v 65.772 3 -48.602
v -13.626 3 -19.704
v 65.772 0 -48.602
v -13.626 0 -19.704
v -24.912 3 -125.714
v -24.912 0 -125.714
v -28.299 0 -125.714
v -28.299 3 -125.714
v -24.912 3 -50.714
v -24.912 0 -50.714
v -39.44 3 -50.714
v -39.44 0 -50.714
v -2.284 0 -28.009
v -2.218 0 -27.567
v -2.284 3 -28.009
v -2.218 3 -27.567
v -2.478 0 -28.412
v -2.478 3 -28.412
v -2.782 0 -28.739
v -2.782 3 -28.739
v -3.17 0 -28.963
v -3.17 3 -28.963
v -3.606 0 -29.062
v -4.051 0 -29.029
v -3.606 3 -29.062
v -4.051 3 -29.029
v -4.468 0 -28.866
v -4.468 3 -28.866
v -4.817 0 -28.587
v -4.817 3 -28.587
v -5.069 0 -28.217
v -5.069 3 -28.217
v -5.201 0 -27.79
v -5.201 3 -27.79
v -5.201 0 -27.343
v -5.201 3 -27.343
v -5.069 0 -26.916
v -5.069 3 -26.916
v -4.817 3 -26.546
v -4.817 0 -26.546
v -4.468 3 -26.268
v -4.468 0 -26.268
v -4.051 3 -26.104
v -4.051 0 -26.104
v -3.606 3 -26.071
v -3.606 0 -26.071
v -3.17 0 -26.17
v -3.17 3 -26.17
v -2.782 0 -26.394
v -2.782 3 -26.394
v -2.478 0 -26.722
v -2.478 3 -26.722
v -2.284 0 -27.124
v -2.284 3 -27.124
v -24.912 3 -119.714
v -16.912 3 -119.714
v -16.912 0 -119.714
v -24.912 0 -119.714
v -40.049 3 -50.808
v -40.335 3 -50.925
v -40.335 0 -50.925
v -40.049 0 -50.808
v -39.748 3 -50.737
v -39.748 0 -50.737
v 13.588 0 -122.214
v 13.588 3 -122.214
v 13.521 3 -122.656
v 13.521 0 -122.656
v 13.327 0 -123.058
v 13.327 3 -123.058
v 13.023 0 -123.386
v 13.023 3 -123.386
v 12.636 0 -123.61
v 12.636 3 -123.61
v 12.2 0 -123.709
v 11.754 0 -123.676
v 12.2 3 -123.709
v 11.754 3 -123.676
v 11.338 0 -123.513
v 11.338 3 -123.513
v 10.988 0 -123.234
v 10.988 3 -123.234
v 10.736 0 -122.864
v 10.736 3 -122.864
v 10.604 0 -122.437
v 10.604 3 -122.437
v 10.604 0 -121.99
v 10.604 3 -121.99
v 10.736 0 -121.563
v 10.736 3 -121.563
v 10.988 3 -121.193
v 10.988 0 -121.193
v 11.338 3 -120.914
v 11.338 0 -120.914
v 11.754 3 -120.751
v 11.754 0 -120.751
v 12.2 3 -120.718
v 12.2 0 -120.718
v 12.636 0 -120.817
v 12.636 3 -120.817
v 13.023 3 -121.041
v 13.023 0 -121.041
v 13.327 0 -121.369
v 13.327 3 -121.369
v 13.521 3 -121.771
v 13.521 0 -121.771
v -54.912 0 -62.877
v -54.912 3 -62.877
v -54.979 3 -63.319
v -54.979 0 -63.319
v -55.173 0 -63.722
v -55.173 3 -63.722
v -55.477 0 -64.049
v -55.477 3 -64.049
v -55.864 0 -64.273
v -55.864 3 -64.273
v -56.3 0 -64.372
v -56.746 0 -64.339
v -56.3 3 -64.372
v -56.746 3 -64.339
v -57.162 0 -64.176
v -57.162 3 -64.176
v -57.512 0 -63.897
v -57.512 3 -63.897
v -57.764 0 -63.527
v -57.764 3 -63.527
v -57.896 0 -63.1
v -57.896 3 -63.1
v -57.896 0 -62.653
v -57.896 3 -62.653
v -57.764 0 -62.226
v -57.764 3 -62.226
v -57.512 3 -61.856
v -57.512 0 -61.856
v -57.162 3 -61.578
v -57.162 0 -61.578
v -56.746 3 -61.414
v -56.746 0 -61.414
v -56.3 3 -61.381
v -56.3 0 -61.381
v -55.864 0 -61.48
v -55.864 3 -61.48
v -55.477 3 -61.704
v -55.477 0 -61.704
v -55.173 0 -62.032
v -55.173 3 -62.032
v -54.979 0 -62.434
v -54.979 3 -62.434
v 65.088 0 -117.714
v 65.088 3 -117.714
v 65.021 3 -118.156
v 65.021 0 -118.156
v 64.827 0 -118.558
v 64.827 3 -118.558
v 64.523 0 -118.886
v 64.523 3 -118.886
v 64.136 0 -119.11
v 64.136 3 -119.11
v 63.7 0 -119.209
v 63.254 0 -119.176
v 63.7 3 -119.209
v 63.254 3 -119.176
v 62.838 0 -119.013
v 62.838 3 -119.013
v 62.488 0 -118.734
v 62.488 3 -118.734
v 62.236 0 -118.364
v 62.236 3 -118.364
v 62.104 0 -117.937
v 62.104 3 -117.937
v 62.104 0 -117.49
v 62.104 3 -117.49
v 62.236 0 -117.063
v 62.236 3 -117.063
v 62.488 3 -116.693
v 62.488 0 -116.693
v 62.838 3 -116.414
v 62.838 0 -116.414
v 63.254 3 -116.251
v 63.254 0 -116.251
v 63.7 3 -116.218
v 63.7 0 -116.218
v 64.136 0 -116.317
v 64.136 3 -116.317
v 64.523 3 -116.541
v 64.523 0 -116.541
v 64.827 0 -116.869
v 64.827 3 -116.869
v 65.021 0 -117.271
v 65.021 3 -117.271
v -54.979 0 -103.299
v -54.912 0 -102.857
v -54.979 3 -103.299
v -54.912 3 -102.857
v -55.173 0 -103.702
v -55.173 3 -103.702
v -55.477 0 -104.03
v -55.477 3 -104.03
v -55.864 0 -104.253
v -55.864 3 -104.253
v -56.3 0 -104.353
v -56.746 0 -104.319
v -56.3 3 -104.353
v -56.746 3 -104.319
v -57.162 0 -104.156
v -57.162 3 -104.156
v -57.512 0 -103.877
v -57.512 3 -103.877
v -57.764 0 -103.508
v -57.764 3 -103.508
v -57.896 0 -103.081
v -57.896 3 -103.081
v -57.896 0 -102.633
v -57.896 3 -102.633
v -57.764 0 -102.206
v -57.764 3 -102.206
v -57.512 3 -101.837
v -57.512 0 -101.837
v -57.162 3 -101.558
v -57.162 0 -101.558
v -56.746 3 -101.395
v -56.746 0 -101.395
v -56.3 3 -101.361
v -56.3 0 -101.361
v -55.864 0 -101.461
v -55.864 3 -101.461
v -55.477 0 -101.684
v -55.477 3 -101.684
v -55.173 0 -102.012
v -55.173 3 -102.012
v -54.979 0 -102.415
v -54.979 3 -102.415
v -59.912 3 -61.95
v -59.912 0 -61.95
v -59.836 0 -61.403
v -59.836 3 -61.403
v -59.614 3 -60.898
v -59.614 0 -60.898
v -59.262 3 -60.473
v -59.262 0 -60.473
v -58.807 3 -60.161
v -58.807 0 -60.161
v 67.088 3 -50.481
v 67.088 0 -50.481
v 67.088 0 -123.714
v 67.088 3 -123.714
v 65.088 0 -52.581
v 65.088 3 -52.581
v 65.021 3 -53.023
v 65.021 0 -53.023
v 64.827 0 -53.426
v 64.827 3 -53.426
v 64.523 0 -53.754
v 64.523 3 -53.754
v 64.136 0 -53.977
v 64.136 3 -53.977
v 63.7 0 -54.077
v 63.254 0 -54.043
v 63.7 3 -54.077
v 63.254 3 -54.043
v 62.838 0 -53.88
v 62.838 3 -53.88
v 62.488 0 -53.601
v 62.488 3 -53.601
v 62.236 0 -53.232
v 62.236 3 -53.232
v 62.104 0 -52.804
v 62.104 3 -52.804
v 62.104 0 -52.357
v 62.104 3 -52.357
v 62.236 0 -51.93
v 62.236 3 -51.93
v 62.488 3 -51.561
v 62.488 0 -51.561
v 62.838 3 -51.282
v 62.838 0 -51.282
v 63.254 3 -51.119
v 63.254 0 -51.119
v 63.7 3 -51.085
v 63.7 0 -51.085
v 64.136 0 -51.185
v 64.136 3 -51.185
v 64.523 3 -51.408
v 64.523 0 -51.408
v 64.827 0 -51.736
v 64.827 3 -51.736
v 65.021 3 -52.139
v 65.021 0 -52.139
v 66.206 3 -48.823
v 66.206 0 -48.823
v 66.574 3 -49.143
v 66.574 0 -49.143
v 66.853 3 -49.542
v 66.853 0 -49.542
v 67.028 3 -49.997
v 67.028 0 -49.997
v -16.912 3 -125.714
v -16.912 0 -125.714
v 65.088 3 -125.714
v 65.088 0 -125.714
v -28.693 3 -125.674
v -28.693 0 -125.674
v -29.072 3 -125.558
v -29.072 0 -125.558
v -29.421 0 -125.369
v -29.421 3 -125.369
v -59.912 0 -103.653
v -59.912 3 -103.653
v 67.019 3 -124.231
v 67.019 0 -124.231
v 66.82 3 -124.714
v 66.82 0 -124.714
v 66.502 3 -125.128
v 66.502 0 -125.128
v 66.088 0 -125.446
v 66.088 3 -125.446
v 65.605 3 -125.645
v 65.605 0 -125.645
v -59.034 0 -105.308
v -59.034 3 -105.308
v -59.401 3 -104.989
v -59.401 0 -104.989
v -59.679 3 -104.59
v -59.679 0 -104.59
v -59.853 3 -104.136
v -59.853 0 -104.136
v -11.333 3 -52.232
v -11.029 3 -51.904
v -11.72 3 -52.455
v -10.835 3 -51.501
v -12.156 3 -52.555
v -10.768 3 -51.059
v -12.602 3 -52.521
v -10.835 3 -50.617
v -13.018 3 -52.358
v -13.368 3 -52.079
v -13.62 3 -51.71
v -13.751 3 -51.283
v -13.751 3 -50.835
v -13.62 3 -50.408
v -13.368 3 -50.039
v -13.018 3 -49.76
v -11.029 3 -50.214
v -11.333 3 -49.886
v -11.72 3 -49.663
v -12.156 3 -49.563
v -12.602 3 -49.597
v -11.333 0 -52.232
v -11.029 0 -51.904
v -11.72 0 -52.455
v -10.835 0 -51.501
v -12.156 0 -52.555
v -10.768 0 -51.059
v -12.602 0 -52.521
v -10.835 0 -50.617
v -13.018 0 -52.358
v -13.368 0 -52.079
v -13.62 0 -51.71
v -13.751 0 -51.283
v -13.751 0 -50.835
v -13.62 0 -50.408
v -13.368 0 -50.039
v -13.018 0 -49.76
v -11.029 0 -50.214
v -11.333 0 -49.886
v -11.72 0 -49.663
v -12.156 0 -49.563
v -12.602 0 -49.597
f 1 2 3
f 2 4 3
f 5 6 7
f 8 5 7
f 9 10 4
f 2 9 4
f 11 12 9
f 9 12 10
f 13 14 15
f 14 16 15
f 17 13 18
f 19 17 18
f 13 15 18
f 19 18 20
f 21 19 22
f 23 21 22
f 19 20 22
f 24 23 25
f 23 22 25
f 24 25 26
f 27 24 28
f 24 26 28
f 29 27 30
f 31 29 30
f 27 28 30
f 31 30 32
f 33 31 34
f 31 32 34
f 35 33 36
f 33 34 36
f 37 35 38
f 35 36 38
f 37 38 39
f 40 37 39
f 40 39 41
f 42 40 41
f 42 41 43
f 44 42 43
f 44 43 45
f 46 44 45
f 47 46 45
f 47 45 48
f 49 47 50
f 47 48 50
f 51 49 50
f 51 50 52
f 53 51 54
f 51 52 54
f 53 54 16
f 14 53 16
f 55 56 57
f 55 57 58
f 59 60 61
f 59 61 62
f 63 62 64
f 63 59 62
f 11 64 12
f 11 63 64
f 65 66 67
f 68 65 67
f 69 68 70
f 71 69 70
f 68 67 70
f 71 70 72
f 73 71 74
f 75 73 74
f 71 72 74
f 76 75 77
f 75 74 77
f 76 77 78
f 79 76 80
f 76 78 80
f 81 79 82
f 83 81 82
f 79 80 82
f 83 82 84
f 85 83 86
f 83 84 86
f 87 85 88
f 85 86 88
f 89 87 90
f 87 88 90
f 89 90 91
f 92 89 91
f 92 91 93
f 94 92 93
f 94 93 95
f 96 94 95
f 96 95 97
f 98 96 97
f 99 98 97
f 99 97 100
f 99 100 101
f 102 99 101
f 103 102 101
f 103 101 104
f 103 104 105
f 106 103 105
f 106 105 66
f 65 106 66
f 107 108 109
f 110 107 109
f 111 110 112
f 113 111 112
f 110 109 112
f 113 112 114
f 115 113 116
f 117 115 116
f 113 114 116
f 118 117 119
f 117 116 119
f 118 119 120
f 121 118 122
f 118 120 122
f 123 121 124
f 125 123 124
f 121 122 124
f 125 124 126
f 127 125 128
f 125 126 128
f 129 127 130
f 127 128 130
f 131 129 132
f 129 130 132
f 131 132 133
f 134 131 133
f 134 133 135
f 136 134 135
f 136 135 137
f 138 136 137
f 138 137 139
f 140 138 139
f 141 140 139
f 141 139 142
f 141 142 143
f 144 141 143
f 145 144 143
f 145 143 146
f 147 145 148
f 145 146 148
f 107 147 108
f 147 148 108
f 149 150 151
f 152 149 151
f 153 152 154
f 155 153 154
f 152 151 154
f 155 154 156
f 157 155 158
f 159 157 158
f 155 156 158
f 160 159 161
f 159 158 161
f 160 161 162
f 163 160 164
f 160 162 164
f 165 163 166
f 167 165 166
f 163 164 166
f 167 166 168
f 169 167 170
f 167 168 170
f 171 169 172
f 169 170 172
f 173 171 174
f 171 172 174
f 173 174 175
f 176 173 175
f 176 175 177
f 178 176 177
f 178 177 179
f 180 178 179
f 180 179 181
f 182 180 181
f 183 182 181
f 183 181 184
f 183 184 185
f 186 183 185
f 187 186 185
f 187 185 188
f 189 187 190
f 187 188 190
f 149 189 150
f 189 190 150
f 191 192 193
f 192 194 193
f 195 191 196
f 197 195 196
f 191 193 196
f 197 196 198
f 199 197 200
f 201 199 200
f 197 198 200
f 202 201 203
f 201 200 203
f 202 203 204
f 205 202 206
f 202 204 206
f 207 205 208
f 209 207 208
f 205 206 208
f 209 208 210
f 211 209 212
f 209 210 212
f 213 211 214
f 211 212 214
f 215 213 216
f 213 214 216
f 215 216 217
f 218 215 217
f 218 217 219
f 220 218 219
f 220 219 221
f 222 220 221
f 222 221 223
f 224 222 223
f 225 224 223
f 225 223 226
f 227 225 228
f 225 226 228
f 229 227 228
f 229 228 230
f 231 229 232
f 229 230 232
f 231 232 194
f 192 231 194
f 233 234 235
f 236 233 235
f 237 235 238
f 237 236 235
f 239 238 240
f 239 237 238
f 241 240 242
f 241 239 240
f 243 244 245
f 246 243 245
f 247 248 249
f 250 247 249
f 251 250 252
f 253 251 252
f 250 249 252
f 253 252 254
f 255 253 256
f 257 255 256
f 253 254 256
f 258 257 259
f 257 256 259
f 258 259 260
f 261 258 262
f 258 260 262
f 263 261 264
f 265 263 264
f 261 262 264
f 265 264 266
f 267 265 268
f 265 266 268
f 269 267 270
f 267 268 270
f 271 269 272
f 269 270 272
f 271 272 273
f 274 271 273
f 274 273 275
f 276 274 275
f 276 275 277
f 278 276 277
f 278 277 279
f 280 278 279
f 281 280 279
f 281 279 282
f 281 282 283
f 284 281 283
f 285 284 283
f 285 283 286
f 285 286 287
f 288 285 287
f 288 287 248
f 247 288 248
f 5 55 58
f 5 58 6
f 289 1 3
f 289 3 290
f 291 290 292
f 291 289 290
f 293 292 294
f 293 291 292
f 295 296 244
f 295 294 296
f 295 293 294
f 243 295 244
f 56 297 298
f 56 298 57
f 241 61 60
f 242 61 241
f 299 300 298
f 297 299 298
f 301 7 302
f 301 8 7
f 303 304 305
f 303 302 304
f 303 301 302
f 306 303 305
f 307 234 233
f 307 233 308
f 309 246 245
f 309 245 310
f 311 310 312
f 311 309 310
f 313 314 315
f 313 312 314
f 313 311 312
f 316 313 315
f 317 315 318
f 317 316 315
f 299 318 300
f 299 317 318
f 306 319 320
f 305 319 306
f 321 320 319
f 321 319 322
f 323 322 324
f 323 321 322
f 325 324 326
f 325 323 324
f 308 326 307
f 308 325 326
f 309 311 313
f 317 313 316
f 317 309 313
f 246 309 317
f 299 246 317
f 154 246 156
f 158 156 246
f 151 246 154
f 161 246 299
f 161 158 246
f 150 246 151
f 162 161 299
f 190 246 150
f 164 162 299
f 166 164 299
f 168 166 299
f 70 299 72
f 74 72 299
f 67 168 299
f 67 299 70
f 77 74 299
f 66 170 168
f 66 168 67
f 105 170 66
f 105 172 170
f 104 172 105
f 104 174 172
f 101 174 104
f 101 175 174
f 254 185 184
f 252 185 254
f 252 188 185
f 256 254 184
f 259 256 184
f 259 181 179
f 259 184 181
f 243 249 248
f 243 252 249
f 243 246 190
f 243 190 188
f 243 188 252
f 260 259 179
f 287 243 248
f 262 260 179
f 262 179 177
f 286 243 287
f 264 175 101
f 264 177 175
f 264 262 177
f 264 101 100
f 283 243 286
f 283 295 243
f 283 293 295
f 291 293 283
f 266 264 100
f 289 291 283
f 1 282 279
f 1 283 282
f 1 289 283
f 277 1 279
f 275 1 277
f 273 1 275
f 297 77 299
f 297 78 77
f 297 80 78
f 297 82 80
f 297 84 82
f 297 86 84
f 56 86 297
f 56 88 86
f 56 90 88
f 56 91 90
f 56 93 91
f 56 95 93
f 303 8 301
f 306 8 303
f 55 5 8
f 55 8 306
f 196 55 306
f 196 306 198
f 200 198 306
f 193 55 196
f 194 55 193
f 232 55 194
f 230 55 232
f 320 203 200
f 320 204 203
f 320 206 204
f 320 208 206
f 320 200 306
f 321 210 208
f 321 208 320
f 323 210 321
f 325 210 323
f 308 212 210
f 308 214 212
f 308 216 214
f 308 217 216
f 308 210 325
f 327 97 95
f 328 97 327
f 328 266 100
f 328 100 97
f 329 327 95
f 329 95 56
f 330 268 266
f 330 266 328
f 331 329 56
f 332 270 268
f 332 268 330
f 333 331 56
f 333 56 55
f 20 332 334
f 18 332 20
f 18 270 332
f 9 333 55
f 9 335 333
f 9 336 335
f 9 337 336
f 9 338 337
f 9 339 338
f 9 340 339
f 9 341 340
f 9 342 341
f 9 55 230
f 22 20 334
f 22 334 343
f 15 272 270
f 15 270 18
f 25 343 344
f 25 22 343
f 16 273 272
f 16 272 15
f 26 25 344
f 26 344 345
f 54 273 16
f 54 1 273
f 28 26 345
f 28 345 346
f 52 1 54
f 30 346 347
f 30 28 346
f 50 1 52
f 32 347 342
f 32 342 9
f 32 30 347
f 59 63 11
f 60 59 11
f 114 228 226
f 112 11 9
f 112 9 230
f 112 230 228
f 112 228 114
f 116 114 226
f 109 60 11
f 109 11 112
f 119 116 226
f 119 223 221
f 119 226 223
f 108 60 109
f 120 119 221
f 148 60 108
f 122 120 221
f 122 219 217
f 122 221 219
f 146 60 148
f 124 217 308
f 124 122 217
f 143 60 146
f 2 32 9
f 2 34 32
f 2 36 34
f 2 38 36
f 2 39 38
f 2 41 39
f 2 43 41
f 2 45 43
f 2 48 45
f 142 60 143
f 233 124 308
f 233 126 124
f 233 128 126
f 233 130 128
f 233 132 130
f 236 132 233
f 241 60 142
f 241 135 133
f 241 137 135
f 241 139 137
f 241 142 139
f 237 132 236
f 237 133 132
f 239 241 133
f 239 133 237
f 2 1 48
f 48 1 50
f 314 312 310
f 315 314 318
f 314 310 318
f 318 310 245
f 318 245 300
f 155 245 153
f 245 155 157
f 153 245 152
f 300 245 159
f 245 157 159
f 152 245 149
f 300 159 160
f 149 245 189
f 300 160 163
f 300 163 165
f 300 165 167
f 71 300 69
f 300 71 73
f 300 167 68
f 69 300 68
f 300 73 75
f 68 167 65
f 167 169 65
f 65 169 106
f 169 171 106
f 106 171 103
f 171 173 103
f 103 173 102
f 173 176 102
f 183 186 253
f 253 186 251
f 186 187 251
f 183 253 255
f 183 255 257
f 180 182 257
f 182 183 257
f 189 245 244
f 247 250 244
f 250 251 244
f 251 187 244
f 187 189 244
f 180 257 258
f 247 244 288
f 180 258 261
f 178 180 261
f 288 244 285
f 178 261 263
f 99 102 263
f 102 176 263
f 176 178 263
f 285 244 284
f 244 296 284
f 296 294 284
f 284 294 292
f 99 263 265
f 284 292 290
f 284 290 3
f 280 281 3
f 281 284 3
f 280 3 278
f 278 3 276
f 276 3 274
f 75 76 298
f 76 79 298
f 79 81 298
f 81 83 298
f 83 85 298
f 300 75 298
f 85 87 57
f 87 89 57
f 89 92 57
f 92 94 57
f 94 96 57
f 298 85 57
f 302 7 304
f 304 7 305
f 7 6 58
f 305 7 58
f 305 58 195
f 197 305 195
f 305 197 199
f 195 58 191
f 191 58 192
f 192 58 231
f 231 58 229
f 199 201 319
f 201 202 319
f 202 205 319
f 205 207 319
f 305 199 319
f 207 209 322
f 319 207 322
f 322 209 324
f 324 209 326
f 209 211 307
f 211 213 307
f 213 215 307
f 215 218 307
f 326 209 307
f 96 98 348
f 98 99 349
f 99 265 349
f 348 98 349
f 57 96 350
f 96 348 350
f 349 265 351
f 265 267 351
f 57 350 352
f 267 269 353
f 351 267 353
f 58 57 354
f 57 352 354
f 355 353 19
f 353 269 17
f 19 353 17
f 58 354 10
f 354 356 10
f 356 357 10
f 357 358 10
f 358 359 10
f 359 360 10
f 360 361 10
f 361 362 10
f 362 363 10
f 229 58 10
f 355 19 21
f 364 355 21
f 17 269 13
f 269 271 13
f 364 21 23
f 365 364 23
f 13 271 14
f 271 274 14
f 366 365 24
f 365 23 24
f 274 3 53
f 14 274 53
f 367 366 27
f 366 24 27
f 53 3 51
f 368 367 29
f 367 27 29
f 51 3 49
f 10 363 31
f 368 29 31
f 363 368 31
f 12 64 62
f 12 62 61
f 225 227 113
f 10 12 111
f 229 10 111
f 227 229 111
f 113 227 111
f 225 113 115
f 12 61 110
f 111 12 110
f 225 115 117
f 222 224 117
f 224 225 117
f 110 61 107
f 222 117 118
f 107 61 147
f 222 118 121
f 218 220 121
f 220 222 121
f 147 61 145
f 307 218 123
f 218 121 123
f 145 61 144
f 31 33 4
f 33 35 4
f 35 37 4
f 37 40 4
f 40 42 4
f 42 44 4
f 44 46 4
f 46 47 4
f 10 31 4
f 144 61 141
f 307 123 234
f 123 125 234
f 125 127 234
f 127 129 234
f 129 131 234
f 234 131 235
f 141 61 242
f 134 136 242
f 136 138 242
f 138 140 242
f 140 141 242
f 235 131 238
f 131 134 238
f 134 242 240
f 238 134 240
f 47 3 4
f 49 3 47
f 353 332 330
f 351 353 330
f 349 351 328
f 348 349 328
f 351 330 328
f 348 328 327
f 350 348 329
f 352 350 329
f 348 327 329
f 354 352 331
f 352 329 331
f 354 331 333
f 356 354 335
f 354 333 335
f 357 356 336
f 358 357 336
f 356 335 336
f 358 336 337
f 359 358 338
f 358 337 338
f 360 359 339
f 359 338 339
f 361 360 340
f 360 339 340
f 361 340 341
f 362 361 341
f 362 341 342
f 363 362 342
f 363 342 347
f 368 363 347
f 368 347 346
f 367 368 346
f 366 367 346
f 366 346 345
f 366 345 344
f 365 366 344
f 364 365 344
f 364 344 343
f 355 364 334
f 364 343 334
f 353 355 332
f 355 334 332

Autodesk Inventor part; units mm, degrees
ref_plane "YZ Plane" through (0, 0, 0) normal (1, 0, 0) x (0, 1, 0)
ref_plane "XZ Plane" through (0, 0, 0) normal (0, 1, 0) x (-1, 0, 0)
ref_plane "XY Plane" through (0, 0, 0) normal (0, 0, 1) x (1, 0, 0)
sketch "Sketch8" plane through (0, 0, 0) normal (0, 1, 0) x (-1, 0, 0)
  line L0 (-67.0875, -125.7135) -> (28.9125, -125.7135)
  line L1 (24.9125, -50.7135) -> (13.6258, -19.7036)
  line L2 (39.9125, -50.7135) -> (24.9125, -50.7135)
  line L3 (-67.0875, -49.0809) -> (-67.0875, -125.7135)
  line L4 (13.6258, -19.7036) -> (-67.0875, -49.0809)
  line L5 (39.9125, -50.7135) -> (59.9125, -60.7135)
  line L6 (59.9125, -104.7135) -> (28.9125, -125.7135)
  line L7 (59.9125, -60.7135) -> (59.9125, -104.7135)
  dimension "d129" = 31
  dimension "d131" = 21
  dimension "d147" = 10
  dimension "d154" = 20
  dimension "d155" = 15
  dimension "d162" = 33
  dimension "d163" = 110
  dimension "d164" = 96
  dimension "d183" = 44
extrude "Extrusion9" add sketch "Sketch8" along normal blind 3
sketch "Sketch9" plane through (0, 3, 0) normal (0, 1, 0) x (1, 0, 0)
  circle A0 centre (63.5875, 117.7135) radius 1.5
  circle A1 centre (-56.4125, 102.857) radius 1.5
  circle A2 centre (-56.4125, 62.8766) radius 1.5
  circle A3 centre (-3.7176, 27.5666) radius 1.5
  circle A4 centre (-12.2681, 51.059) radius 1.5
  line L0 (-24.9125, 50.7135) -> (-13.6258, 19.7036) projected
  line L1 (-13.6258, 19.7036) -> (67.0875, 49.0809) projected
  line L2 (67.0875, 49.0809) -> (67.0875, 125.7135) projected
  line L3 (67.0875, 125.7135) -> (-28.9125, 125.7135) projected
  line L4 (-28.9125, 125.7135) -> (-59.9125, 104.7135) projected
  line L5 (-59.9125, 104.7135) -> (-59.9125, 60.7135) projected
  line L6 (-59.9125, 60.7135) -> (-39.9125, 50.7135) projected
  line L7 (-39.9125, 50.7135) -> (-24.9125, 50.7135) projected
  line L8 (-56.4125, 102.857) -> (-27.8386, 122.2135) construction
  line L9 (-27.8386, 122.2135) -> (63.5875, 122.2135) construction
  line L10 (63.5875, 122.2135) -> (63.5875, 51.5316) construction
  line L11 (63.5875, 51.5316) -> (-11.534, 24.1896) construction
  line L12 (-11.534, 24.1896) -> (-22.4618, 54.2135) construction
  line L13 (-22.4618, 54.2135) -> (-39.0863, 54.2135) construction
  line L14 (-39.0863, 54.2135) -> (-56.4125, 62.8766) construction
  line L15 (-56.4125, 62.8766) -> (-56.4125, 102.857) construction
  line L16 (-39.9125, 50.7135) -> (-24.9125, 50.7135) construction
  line L17 (-24.9125, 50.7135) -> (-21.6236, 51.9106) construction
  circle A5 centre (63.5875, 52.5809) radius 1.5
  line L18 (-24.9125, 50.7135) -> (-13.6258, 19.7036) construction
  line L19 (-23.5444, 46.9547) -> (-12.2681, 51.059) construction
  circle A6 centre (12.0875, 122.2135) radius 1.5
  point P0 (0, 0)
  dimension "d135" = 3
  dimension "d136" = 3
  dimension "d137" = 3
  dimension "d165" = 3
  dimension "d166" = 3
  dimension "d169" = 3.5
  dimension "d185" = 3
  dimension "d186" = 3.5
  dimension "d187" = 3.5
  dimension "d191" = 12
  dimension "d193" = 4
  dimension "d194" = 12
  dimension "d195" = 4
  dimension "d204" = 8
  dimension "d205" = 3
  dimension "d206" = 55
extrude "Extrusion10" cut sketch "Sketch9" against normal through all contours A0 | A1 | A2 | A3 | A4 | A5 | A6
sketch "Sketch10" plane through (0, 3, 0) normal (0, 1, 0) x (1, 0, 0)
  line L0 (-28.9125, 125.7135) -> (-59.9125, 104.7135) projected
  line L1 (67.0875, 125.7135) -> (-28.9125, 125.7135) projected
  line L2 (-24.9125, 125.7135) -> (-16.9125, 125.7135)
  line L3 (-16.9125, 125.7135) -> (-16.9125, 119.7135)
  line L4 (-16.9125, 119.7135) -> (-24.9125, 119.7135)
  line L5 (-24.9125, 119.7135) -> (-24.9125, 125.7135)
  point P0 (-17.0619, -65.3949)
  dimension "d179" = 4
  dimension "d180" = 6
  dimension "d181" = 8
extrude "Extrusion11" cut sketch "Sketch10" against normal through all
fillet "Fillet1" radius 2 1 edges at (-39.9125, 1.5, -50.7135)
fillet "Fillet2" radius 2 1 edges at (-59.9125, 1.5, -60.7135)
fillet "Fillet3" radius 2 1 edges at (-59.9125, 1.5, -104.7135)
fillet "Fillet4" radius 2 1 edges at (-28.9125, 1.5, -125.7135)
fillet "Fillet5" radius 2 1 edges at (67.0875, 1.5, -125.7135)
fillet "Fillet6" radius 2 1 edges at (67.0875, 1.5, -49.0809)
properties part number "k2_base"
